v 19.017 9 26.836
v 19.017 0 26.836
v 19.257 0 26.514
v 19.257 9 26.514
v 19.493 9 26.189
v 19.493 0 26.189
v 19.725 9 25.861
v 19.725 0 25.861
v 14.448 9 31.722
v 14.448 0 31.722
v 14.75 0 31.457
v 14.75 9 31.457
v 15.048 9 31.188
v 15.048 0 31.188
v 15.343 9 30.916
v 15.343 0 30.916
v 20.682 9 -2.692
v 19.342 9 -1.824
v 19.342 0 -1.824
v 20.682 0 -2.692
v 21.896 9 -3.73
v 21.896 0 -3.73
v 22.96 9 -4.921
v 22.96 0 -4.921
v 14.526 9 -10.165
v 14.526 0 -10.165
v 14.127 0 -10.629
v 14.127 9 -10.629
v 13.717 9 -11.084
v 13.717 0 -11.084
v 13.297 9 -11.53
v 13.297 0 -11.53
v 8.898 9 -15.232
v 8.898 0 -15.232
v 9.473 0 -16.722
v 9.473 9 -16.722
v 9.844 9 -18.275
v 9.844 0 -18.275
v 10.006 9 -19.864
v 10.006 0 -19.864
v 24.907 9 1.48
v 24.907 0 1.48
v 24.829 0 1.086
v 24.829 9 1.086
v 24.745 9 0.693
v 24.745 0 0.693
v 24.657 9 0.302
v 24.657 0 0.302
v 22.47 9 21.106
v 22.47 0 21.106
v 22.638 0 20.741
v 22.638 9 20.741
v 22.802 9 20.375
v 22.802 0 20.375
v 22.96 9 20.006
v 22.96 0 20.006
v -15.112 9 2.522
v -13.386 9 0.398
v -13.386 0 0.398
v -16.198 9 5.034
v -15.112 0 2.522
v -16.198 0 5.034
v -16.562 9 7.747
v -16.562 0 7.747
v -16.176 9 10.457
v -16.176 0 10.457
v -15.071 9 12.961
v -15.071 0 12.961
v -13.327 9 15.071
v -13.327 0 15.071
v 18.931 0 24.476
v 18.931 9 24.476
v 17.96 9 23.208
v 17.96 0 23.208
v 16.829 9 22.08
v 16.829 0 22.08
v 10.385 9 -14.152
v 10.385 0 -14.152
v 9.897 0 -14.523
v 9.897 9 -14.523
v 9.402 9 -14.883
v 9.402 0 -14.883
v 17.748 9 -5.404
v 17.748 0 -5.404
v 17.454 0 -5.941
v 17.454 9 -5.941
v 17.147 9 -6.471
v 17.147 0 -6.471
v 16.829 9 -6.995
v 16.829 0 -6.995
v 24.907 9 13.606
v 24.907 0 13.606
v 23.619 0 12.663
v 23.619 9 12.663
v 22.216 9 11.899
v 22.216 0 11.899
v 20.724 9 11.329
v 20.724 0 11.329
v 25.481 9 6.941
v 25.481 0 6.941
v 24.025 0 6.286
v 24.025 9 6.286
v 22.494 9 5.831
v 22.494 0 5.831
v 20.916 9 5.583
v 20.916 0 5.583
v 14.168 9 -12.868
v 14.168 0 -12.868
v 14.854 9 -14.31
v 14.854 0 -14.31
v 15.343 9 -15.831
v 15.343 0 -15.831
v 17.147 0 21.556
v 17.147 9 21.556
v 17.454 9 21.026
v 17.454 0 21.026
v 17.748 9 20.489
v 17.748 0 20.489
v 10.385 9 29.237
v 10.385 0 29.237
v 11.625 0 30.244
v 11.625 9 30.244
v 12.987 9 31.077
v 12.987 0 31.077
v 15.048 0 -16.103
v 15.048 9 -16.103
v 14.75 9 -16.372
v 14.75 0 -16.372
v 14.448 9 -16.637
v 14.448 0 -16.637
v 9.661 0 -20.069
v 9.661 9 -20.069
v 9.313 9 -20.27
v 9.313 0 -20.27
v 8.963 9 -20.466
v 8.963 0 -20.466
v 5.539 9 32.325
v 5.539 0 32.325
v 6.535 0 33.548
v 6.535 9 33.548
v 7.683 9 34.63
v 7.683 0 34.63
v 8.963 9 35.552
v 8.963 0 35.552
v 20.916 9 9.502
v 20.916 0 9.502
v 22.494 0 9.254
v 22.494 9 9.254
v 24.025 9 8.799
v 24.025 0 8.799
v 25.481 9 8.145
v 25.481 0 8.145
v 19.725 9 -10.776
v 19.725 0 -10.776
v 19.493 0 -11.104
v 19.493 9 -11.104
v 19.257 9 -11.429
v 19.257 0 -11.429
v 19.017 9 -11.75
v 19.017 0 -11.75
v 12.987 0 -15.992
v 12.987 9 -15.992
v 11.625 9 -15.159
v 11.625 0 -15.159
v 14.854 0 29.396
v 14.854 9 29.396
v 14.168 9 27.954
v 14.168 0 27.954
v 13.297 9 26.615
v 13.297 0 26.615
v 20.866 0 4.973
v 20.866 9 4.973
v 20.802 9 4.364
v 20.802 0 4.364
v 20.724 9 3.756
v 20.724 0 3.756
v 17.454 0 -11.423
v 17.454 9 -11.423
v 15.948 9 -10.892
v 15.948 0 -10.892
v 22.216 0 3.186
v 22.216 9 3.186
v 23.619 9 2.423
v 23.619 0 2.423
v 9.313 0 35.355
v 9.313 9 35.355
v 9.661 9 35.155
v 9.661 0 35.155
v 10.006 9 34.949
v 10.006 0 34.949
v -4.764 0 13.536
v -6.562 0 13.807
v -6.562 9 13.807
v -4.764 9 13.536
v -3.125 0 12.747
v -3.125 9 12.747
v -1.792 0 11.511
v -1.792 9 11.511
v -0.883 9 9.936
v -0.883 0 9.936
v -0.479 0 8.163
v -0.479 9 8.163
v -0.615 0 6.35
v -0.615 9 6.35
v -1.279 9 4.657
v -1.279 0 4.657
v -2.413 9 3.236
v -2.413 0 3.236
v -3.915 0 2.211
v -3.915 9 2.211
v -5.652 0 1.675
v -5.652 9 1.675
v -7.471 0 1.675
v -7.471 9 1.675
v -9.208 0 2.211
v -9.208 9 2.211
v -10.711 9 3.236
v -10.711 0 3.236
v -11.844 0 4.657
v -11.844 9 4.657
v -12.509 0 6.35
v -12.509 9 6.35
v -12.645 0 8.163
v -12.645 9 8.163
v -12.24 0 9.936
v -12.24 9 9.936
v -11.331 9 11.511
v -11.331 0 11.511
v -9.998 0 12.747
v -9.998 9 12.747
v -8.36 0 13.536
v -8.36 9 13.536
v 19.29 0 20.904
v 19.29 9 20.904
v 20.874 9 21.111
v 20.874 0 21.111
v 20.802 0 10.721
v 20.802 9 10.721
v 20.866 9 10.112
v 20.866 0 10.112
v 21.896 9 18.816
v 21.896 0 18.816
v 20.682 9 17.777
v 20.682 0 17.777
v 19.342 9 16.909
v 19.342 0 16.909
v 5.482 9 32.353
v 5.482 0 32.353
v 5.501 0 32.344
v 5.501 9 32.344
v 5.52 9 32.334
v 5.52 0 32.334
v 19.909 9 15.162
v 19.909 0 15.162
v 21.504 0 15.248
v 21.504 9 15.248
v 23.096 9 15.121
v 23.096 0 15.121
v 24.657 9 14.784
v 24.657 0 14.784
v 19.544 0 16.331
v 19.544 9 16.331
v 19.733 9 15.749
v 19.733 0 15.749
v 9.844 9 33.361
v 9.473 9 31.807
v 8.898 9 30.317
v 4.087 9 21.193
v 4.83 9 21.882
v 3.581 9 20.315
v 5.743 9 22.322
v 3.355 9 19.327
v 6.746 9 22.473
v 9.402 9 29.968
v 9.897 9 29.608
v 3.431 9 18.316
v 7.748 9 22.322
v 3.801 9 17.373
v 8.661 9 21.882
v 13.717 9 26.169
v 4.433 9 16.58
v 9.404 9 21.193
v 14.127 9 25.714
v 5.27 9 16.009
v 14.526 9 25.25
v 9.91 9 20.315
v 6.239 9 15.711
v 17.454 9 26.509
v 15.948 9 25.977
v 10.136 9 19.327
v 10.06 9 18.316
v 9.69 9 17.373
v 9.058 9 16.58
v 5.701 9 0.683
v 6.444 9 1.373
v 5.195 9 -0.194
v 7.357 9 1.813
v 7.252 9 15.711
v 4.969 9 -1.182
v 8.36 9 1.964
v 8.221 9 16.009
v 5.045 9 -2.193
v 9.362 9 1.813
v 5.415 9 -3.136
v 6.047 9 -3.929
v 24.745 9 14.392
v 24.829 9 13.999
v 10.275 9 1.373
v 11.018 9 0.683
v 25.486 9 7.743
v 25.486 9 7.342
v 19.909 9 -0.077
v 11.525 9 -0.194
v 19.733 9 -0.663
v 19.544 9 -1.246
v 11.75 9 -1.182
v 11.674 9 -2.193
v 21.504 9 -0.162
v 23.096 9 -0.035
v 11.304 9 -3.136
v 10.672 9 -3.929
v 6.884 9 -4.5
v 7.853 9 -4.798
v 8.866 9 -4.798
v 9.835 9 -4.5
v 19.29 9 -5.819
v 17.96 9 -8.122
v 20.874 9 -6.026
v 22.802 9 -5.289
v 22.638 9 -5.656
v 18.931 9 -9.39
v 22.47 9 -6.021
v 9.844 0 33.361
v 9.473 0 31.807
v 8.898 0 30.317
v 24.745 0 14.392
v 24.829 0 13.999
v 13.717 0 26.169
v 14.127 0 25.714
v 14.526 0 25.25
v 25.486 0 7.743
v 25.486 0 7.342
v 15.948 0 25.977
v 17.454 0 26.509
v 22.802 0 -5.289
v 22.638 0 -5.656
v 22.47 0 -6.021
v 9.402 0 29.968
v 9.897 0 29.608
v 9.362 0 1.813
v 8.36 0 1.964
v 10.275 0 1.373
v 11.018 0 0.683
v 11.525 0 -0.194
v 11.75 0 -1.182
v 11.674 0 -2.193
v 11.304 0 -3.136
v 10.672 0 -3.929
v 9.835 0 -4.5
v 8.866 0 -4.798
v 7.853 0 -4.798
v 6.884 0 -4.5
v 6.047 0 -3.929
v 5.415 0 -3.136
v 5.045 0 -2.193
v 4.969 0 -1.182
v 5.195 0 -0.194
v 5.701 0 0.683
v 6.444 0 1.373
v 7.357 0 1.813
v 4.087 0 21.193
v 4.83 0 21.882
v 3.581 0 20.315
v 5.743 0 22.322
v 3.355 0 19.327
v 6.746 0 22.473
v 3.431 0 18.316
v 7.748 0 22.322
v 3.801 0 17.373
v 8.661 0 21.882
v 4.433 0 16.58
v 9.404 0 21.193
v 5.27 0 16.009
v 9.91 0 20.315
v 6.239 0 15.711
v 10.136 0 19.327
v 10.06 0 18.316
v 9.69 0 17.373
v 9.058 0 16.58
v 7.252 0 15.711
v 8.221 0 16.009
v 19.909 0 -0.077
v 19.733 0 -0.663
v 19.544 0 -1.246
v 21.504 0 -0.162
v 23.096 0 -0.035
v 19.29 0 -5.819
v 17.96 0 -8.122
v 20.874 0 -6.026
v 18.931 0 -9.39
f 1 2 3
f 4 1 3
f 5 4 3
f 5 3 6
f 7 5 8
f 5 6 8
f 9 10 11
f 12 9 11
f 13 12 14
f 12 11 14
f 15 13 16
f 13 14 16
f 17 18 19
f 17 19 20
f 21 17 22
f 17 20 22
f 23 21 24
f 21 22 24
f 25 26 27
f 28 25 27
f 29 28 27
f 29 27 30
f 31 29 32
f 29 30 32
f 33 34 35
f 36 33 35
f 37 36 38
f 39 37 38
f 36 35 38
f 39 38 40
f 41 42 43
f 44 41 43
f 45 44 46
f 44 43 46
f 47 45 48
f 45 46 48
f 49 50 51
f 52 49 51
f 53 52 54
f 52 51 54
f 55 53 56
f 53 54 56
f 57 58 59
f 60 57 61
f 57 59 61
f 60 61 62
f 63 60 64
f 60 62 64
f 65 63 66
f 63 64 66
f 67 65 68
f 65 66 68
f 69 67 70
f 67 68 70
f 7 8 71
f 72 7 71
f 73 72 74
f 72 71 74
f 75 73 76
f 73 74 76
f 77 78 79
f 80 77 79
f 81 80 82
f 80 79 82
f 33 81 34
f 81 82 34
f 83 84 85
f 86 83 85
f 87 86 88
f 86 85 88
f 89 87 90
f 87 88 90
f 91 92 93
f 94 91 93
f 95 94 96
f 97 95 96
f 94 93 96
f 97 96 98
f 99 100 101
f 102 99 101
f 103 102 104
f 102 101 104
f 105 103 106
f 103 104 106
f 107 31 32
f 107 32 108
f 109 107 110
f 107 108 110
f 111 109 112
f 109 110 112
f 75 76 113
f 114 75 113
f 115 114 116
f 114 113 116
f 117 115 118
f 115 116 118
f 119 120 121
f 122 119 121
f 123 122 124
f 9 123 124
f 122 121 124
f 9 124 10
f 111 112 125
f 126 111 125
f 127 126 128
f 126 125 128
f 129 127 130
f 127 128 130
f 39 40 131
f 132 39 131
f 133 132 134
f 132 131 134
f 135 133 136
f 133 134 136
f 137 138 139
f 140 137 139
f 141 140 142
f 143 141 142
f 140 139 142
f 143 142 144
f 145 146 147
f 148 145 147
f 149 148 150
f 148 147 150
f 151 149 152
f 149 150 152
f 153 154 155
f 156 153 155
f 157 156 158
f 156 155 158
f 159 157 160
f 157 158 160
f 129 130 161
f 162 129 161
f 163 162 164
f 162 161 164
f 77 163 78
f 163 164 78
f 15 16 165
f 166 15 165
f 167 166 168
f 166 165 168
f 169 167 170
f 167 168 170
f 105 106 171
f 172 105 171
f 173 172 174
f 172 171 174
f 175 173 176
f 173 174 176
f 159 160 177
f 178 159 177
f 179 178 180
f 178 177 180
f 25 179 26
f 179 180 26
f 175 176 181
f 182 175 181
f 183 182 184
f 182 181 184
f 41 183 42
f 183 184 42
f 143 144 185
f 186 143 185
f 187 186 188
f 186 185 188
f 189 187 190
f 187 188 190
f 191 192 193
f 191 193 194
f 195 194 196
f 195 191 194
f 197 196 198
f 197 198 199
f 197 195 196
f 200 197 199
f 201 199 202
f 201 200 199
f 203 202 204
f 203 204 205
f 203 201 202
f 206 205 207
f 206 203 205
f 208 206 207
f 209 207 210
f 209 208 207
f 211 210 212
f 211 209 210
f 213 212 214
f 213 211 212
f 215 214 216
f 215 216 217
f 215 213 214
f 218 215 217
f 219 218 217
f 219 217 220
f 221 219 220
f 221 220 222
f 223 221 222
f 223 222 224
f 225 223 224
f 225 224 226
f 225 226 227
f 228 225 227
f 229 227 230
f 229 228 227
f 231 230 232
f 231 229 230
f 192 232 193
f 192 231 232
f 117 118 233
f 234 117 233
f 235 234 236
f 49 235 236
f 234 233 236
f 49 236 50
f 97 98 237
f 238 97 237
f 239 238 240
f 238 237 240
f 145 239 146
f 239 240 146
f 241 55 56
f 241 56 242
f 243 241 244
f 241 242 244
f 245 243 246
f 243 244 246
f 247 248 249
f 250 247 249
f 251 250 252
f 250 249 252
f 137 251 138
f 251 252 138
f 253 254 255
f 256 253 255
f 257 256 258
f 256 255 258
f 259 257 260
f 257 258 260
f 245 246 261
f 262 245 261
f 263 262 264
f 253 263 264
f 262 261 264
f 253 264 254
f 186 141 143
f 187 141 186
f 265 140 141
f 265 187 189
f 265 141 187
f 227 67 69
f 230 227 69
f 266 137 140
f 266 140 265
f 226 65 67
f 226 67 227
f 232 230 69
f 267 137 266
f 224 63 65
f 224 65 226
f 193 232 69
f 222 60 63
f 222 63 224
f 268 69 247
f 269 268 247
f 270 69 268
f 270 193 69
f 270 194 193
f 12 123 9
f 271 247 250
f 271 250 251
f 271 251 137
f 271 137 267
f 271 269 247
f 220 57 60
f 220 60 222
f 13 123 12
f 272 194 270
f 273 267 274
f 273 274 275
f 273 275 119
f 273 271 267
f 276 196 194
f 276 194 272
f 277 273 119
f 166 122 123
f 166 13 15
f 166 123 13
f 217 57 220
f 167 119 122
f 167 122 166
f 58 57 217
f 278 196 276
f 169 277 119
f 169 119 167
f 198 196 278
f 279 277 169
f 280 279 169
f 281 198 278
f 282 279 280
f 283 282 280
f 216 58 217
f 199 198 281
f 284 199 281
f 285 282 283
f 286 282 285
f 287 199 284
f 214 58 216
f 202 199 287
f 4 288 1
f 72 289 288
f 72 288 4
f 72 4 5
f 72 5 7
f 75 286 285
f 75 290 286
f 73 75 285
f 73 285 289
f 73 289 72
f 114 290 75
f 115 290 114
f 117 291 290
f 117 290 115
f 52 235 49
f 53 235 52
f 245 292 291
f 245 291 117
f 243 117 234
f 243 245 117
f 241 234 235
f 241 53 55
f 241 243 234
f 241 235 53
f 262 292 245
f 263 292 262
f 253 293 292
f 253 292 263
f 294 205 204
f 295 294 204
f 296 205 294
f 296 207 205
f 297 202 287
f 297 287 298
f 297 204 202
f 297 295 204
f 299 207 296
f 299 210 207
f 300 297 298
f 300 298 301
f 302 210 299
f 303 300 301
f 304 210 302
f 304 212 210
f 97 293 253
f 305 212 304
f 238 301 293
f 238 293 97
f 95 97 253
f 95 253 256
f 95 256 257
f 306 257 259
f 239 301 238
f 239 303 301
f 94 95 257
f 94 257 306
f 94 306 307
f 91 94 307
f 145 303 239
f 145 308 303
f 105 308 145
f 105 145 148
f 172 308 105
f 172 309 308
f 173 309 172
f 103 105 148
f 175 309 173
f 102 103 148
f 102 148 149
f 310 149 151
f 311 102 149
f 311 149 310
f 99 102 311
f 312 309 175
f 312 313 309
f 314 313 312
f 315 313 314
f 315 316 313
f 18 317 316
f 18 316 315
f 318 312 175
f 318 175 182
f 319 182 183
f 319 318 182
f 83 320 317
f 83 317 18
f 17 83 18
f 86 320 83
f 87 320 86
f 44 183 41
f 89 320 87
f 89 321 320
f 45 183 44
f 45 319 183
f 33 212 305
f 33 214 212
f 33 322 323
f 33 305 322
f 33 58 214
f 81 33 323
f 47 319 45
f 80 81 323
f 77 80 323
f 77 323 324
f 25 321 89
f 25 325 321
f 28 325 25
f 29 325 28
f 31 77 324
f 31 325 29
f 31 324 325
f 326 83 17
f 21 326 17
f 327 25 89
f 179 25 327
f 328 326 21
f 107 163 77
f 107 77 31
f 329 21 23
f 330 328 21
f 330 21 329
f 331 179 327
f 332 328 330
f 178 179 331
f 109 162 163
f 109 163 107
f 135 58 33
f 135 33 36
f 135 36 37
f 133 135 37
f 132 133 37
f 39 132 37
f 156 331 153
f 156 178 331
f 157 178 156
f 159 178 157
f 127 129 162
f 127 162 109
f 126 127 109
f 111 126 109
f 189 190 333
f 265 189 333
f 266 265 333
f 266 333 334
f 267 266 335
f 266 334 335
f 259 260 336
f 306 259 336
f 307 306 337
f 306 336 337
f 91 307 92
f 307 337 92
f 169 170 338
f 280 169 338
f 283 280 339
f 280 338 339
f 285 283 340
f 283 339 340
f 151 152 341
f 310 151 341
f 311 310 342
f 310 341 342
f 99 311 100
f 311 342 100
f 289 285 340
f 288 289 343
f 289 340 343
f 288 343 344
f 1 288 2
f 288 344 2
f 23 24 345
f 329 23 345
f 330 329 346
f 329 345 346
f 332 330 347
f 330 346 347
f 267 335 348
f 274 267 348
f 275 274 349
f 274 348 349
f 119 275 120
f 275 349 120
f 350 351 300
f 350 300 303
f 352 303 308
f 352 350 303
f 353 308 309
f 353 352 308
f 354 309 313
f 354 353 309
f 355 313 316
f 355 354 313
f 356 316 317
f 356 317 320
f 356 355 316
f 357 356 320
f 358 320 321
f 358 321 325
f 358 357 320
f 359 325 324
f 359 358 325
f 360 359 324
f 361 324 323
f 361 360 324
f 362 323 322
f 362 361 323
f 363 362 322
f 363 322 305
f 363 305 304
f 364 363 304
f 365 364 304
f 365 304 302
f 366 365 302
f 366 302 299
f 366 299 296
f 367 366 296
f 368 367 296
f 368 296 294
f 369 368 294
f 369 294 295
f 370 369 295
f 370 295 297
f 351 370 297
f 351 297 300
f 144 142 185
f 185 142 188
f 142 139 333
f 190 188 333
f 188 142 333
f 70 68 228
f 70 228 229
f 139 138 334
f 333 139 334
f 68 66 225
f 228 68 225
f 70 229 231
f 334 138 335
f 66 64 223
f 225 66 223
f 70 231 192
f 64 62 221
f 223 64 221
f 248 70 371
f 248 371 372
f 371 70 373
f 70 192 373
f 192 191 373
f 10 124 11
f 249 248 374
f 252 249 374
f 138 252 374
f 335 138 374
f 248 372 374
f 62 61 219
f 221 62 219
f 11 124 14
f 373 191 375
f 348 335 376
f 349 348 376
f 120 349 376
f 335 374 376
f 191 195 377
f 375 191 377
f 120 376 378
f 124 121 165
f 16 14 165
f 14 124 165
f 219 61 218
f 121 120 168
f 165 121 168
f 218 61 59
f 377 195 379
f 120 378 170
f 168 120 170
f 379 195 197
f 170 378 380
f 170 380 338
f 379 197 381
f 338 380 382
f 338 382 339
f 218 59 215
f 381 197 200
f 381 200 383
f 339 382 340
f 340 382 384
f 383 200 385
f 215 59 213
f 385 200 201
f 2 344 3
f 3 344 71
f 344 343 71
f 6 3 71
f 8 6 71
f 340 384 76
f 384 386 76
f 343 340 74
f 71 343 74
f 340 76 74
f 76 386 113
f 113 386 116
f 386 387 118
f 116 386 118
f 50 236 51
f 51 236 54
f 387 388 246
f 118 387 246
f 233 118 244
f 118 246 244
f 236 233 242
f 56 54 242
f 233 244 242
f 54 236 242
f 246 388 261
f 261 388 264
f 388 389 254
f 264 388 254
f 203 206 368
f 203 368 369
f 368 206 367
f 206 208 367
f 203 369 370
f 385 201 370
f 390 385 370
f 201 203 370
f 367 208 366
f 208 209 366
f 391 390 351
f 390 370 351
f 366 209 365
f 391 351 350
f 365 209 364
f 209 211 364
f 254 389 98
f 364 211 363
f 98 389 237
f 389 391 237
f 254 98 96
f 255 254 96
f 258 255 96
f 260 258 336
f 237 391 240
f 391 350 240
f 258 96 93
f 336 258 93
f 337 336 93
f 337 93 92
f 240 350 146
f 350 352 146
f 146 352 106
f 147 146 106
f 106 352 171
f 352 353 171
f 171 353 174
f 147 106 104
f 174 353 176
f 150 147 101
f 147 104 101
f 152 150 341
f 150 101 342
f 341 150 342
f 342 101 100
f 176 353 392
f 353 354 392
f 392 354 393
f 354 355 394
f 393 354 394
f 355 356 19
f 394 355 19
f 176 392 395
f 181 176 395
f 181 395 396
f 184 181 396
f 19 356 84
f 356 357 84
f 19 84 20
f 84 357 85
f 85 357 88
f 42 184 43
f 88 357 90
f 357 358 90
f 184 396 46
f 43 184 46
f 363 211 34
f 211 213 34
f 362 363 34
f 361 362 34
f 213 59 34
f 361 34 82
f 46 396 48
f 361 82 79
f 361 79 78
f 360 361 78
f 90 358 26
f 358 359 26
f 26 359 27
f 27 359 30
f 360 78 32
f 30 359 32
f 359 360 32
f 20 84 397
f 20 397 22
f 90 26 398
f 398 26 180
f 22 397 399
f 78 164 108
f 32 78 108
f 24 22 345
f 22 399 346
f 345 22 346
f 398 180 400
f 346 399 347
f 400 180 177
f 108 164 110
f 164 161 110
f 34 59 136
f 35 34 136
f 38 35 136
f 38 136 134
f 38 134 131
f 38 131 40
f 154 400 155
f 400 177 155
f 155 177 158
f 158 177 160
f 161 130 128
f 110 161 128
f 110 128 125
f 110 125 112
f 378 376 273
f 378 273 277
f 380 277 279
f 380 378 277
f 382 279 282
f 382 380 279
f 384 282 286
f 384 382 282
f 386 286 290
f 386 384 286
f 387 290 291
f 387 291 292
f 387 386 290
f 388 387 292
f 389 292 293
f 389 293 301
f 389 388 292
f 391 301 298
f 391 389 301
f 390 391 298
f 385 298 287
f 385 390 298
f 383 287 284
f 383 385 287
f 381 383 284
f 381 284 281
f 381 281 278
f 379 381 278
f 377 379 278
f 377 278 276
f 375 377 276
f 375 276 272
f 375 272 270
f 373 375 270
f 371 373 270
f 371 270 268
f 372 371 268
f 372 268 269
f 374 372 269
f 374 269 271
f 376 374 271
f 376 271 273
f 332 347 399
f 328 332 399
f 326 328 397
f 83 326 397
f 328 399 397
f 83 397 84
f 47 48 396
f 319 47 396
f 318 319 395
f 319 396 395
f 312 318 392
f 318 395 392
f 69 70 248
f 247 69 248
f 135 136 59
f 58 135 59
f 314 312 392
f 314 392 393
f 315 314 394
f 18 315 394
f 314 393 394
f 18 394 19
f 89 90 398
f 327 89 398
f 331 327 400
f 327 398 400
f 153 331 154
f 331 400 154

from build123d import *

# Parameters (mm, degrees)
SKETCH_1_R          = 2.6
SKETCH_1_R_2        = 6.1
EXTRUDE_1_DEPTH     = 9
CUT_EXTRUDE_START   = -10
SKETCH_2_R          = 3.4
SKETCH_2_R_2        = 2.6
CUT_EXTRUDE_1_DEPTH = 10


with BuildPart() as part:
    # 草图1 → 凸台-拉伸1 (new body)
    with BuildSketch(Plane(origin=(0, 0, 0), x_dir=(1, 0, 0), z_dir=(0, 1, 0))):
        with BuildLine():
            ThreePointArc((10.005741881, 19.864209328), (9.487119891, 20.17017771), (8.962832505, 20.466333337))
            Line((8.962832505, 20.466333337), (-13.385709221, -0.397651364))
            ThreePointArc((-13.385709221, -0.397651364), (-16.561513437, -7.747050572), (-13.327428101, -15.070990303))
            Line((-13.327428101, -15.070990303), (5.481515962, -32.352919827))
            ThreePointArc((5.481515962, -32.352919827), (5.510229247, -32.338868299), (5.538926138, -32.32478332))
            ThreePointArc((5.538926138, -32.32478332), (7.091187682, -34.107638735), (8.962832505, -35.551603759))
            ThreePointArc((8.962832505, -35.551603759), (9.487119891, -35.255448132), (10.005741881, -34.94947975))
            ThreePointArc((10.005741881, -34.94947975), (9.684229712, -32.57790044), (8.898482853, -30.317289822))
            ThreePointArc((8.898482853, -30.317289822), (9.650626544, -29.789793539), (10.384730504, -29.237467697))
            ThreePointArc((10.384730504, -29.237467697), (12.29188983, -30.683324466), (14.448043063, -31.721959019))
            ThreePointArc((14.448043063, -31.721959019), (14.899299295, -31.323269626), (15.342973746, -30.916159812))
            ThreePointArc((15.342973746, -30.916159812), (14.535408326, -28.663251339), (13.296824545, -26.615406445))
            ThreePointArc((13.296824545, -26.615406445), (13.922859447, -25.943057755), (14.526086474, -25.250172762))
            ThreePointArc((14.526086474, -25.250172762), (16.692180319, -26.267913372), (19.017160696, -26.835561803))
            ThreePointArc((19.017160696, -26.835561803), (19.375663711, -26.351763284), (19.724999921, -25.861304691))
            ThreePointArc((19.724999921, -25.861304691), (18.466675733, -23.825529966), (16.829387085, -22.079951444))
            ThreePointArc((16.829387085, -22.079951444), (17.30195247, -21.292135211), (17.747938649, -20.488973466))
            ThreePointArc((17.747938649, -20.488973466), (20.078298317, -21.034117768), (22.47049304, -21.105971118))
            ThreePointArc((22.47049304, -21.105971118), (22.720574536, -20.558207789), (22.960304836, -20.005835811))
            ThreePointArc((22.960304836, -20.005835811), (21.306216685, -18.276167958), (19.34178054, -16.909145965))
            ThreePointArc((19.34178054, -16.909145965), (19.640223033, -16.040293539), (19.909476627, -15.161957065))
            ThreePointArc((19.909476627, -15.161957065), (22.302254219, -15.210679637), (24.657112899, -14.783597569))
            ThreePointArc((24.657112899, -14.783597569), (24.787843115, -14.195809317), (24.907490141, -13.60566526))
            ThreePointArc((24.907490141, -13.60566526), (22.929929617, -12.257699063), (20.724201261, -11.328979021))
            ThreePointArc((20.724201261, -11.328979021), (20.835477492, -10.417063422), (20.916230828, -9.501939738))
            ThreePointArc((20.916230828, -9.501939738), (23.266850481, -9.052111169), (25.481454494, -8.14475922))
            ThreePointArc((25.481454494, -8.14475922), (25.487119891, -7.542635211), (25.481454494, -6.940511202))
            ThreePointArc((25.481454494, -6.940511202), (23.266850481, -6.033159253), (20.916230828, -5.583330684))
            ThreePointArc((20.916230828, -5.583330684), (20.835477492, -4.668206999), (20.724201261, -3.7562914))
            ThreePointArc((20.724201261, -3.7562914), (22.929929617, -2.827571359), (24.907490141, -1.479605162))
            ThreePointArc((24.907490141, -1.479605162), (24.787843115, -0.889461105), (24.657112899, -0.301672852))
            ThreePointArc((24.657112899, -0.301672852), (22.302254219, 0.125409215), (19.909476627, 0.076686643))
            ThreePointArc((19.909476627, 0.076686643), (19.640223033, 0.955023117), (19.34178054, 1.823875544))
            ThreePointArc((19.34178054, 1.823875544), (21.306216685, 3.190897536), (22.960304836, 4.92056539))
            ThreePointArc((22.960304836, 4.92056539), (22.720574536, 5.472937368), (22.47049304, 6.020700696))
            ThreePointArc((22.47049304, 6.020700696), (20.078298317, 5.948847346), (17.747938649, 5.403703045))
            ThreePointArc((17.747938649, 5.403703045), (17.30195247, 6.206864789), (16.829387085, 6.994681022))
            ThreePointArc((16.829387085, 6.994681022), (18.466675733, 8.740259544), (19.724999921, 10.77603427))
            ThreePointArc((19.724999921, 10.77603427), (19.375663711, 11.266492862), (19.017160696, 11.750291382))
            ThreePointArc((19.017160696, 11.750291382), (16.692180319, 11.18264295), (14.526086474, 10.16490234))
            ThreePointArc((14.526086474, 10.16490234), (13.922859447, 10.857787333), (13.296824545, 11.530136023))
            ThreePointArc((13.296824545, 11.530136023), (14.535408326, 13.577980918), (15.342973746, 15.830889391))
            ThreePointArc((15.342973746, 15.830889391), (14.899299295, 16.237999204), (14.448043063, 16.636688597))
            ThreePointArc((14.448043063, 16.636688597), (12.29188983, 15.598054044), (10.384730504, 14.152197275))
            ThreePointArc((10.384730504, 14.152197275), (9.650626544, 14.704523117), (8.898482853, 15.2320194))
            ThreePointArc((8.898482853, 15.2320194), (9.684229712, 17.492630019), (10.005741881, 19.864209328))
        make_face()
        with Locations(Location((6.745512081, -19.072672674, 0), (0, 0, 270))):
            Circle(SKETCH_1_R, mode=Mode.SUBTRACT)
        with Locations(Location((8.35961056, 1.436393055, 0), (0, 0, 270))):
            Circle(SKETCH_1_R, mode=Mode.SUBTRACT)
        with Locations(Location((-6.561592317, -7.707331828, 0), (0, 0, 270))):
            Circle(SKETCH_1_R_2, mode=Mode.SUBTRACT)
    extrude(amount=EXTRUDE_1_DEPTH)

    # 草图2 → 切除-拉伸1 (cut)
    # profile 1 of 2: a face of its own
    with BuildSketch(Plane(origin=(0, 9, 0), x_dir=(1, 0, 0), z_dir=(0, 1, 0)).offset(CUT_EXTRUDE_START)):
        with Locations(Location((8.35961056, 1.436393055, 0), (0, 0, 270))):
            Circle(SKETCH_2_R)
        with Locations((8.35961056, 1.436393055)):
            Circle(SKETCH_2_R_2, mode=Mode.SUBTRACT)
    # profile 2 of 2: a face of its own
    with BuildSketch(Plane(origin=(0, 9, 0), x_dir=(1, 0, 0), z_dir=(0, 1, 0)).offset(CUT_EXTRUDE_START)):
        with Locations(Location((6.745512081, -19.072672674, 0), (0, 0, 270))):
            Circle(SKETCH_2_R)
        with Locations((6.745512081, -19.072672674)):
            Circle(SKETCH_2_R_2, mode=Mode.SUBTRACT)
    extrude(amount=CUT_EXTRUDE_1_DEPTH, mode=Mode.SUBTRACT)


solid = part.part
